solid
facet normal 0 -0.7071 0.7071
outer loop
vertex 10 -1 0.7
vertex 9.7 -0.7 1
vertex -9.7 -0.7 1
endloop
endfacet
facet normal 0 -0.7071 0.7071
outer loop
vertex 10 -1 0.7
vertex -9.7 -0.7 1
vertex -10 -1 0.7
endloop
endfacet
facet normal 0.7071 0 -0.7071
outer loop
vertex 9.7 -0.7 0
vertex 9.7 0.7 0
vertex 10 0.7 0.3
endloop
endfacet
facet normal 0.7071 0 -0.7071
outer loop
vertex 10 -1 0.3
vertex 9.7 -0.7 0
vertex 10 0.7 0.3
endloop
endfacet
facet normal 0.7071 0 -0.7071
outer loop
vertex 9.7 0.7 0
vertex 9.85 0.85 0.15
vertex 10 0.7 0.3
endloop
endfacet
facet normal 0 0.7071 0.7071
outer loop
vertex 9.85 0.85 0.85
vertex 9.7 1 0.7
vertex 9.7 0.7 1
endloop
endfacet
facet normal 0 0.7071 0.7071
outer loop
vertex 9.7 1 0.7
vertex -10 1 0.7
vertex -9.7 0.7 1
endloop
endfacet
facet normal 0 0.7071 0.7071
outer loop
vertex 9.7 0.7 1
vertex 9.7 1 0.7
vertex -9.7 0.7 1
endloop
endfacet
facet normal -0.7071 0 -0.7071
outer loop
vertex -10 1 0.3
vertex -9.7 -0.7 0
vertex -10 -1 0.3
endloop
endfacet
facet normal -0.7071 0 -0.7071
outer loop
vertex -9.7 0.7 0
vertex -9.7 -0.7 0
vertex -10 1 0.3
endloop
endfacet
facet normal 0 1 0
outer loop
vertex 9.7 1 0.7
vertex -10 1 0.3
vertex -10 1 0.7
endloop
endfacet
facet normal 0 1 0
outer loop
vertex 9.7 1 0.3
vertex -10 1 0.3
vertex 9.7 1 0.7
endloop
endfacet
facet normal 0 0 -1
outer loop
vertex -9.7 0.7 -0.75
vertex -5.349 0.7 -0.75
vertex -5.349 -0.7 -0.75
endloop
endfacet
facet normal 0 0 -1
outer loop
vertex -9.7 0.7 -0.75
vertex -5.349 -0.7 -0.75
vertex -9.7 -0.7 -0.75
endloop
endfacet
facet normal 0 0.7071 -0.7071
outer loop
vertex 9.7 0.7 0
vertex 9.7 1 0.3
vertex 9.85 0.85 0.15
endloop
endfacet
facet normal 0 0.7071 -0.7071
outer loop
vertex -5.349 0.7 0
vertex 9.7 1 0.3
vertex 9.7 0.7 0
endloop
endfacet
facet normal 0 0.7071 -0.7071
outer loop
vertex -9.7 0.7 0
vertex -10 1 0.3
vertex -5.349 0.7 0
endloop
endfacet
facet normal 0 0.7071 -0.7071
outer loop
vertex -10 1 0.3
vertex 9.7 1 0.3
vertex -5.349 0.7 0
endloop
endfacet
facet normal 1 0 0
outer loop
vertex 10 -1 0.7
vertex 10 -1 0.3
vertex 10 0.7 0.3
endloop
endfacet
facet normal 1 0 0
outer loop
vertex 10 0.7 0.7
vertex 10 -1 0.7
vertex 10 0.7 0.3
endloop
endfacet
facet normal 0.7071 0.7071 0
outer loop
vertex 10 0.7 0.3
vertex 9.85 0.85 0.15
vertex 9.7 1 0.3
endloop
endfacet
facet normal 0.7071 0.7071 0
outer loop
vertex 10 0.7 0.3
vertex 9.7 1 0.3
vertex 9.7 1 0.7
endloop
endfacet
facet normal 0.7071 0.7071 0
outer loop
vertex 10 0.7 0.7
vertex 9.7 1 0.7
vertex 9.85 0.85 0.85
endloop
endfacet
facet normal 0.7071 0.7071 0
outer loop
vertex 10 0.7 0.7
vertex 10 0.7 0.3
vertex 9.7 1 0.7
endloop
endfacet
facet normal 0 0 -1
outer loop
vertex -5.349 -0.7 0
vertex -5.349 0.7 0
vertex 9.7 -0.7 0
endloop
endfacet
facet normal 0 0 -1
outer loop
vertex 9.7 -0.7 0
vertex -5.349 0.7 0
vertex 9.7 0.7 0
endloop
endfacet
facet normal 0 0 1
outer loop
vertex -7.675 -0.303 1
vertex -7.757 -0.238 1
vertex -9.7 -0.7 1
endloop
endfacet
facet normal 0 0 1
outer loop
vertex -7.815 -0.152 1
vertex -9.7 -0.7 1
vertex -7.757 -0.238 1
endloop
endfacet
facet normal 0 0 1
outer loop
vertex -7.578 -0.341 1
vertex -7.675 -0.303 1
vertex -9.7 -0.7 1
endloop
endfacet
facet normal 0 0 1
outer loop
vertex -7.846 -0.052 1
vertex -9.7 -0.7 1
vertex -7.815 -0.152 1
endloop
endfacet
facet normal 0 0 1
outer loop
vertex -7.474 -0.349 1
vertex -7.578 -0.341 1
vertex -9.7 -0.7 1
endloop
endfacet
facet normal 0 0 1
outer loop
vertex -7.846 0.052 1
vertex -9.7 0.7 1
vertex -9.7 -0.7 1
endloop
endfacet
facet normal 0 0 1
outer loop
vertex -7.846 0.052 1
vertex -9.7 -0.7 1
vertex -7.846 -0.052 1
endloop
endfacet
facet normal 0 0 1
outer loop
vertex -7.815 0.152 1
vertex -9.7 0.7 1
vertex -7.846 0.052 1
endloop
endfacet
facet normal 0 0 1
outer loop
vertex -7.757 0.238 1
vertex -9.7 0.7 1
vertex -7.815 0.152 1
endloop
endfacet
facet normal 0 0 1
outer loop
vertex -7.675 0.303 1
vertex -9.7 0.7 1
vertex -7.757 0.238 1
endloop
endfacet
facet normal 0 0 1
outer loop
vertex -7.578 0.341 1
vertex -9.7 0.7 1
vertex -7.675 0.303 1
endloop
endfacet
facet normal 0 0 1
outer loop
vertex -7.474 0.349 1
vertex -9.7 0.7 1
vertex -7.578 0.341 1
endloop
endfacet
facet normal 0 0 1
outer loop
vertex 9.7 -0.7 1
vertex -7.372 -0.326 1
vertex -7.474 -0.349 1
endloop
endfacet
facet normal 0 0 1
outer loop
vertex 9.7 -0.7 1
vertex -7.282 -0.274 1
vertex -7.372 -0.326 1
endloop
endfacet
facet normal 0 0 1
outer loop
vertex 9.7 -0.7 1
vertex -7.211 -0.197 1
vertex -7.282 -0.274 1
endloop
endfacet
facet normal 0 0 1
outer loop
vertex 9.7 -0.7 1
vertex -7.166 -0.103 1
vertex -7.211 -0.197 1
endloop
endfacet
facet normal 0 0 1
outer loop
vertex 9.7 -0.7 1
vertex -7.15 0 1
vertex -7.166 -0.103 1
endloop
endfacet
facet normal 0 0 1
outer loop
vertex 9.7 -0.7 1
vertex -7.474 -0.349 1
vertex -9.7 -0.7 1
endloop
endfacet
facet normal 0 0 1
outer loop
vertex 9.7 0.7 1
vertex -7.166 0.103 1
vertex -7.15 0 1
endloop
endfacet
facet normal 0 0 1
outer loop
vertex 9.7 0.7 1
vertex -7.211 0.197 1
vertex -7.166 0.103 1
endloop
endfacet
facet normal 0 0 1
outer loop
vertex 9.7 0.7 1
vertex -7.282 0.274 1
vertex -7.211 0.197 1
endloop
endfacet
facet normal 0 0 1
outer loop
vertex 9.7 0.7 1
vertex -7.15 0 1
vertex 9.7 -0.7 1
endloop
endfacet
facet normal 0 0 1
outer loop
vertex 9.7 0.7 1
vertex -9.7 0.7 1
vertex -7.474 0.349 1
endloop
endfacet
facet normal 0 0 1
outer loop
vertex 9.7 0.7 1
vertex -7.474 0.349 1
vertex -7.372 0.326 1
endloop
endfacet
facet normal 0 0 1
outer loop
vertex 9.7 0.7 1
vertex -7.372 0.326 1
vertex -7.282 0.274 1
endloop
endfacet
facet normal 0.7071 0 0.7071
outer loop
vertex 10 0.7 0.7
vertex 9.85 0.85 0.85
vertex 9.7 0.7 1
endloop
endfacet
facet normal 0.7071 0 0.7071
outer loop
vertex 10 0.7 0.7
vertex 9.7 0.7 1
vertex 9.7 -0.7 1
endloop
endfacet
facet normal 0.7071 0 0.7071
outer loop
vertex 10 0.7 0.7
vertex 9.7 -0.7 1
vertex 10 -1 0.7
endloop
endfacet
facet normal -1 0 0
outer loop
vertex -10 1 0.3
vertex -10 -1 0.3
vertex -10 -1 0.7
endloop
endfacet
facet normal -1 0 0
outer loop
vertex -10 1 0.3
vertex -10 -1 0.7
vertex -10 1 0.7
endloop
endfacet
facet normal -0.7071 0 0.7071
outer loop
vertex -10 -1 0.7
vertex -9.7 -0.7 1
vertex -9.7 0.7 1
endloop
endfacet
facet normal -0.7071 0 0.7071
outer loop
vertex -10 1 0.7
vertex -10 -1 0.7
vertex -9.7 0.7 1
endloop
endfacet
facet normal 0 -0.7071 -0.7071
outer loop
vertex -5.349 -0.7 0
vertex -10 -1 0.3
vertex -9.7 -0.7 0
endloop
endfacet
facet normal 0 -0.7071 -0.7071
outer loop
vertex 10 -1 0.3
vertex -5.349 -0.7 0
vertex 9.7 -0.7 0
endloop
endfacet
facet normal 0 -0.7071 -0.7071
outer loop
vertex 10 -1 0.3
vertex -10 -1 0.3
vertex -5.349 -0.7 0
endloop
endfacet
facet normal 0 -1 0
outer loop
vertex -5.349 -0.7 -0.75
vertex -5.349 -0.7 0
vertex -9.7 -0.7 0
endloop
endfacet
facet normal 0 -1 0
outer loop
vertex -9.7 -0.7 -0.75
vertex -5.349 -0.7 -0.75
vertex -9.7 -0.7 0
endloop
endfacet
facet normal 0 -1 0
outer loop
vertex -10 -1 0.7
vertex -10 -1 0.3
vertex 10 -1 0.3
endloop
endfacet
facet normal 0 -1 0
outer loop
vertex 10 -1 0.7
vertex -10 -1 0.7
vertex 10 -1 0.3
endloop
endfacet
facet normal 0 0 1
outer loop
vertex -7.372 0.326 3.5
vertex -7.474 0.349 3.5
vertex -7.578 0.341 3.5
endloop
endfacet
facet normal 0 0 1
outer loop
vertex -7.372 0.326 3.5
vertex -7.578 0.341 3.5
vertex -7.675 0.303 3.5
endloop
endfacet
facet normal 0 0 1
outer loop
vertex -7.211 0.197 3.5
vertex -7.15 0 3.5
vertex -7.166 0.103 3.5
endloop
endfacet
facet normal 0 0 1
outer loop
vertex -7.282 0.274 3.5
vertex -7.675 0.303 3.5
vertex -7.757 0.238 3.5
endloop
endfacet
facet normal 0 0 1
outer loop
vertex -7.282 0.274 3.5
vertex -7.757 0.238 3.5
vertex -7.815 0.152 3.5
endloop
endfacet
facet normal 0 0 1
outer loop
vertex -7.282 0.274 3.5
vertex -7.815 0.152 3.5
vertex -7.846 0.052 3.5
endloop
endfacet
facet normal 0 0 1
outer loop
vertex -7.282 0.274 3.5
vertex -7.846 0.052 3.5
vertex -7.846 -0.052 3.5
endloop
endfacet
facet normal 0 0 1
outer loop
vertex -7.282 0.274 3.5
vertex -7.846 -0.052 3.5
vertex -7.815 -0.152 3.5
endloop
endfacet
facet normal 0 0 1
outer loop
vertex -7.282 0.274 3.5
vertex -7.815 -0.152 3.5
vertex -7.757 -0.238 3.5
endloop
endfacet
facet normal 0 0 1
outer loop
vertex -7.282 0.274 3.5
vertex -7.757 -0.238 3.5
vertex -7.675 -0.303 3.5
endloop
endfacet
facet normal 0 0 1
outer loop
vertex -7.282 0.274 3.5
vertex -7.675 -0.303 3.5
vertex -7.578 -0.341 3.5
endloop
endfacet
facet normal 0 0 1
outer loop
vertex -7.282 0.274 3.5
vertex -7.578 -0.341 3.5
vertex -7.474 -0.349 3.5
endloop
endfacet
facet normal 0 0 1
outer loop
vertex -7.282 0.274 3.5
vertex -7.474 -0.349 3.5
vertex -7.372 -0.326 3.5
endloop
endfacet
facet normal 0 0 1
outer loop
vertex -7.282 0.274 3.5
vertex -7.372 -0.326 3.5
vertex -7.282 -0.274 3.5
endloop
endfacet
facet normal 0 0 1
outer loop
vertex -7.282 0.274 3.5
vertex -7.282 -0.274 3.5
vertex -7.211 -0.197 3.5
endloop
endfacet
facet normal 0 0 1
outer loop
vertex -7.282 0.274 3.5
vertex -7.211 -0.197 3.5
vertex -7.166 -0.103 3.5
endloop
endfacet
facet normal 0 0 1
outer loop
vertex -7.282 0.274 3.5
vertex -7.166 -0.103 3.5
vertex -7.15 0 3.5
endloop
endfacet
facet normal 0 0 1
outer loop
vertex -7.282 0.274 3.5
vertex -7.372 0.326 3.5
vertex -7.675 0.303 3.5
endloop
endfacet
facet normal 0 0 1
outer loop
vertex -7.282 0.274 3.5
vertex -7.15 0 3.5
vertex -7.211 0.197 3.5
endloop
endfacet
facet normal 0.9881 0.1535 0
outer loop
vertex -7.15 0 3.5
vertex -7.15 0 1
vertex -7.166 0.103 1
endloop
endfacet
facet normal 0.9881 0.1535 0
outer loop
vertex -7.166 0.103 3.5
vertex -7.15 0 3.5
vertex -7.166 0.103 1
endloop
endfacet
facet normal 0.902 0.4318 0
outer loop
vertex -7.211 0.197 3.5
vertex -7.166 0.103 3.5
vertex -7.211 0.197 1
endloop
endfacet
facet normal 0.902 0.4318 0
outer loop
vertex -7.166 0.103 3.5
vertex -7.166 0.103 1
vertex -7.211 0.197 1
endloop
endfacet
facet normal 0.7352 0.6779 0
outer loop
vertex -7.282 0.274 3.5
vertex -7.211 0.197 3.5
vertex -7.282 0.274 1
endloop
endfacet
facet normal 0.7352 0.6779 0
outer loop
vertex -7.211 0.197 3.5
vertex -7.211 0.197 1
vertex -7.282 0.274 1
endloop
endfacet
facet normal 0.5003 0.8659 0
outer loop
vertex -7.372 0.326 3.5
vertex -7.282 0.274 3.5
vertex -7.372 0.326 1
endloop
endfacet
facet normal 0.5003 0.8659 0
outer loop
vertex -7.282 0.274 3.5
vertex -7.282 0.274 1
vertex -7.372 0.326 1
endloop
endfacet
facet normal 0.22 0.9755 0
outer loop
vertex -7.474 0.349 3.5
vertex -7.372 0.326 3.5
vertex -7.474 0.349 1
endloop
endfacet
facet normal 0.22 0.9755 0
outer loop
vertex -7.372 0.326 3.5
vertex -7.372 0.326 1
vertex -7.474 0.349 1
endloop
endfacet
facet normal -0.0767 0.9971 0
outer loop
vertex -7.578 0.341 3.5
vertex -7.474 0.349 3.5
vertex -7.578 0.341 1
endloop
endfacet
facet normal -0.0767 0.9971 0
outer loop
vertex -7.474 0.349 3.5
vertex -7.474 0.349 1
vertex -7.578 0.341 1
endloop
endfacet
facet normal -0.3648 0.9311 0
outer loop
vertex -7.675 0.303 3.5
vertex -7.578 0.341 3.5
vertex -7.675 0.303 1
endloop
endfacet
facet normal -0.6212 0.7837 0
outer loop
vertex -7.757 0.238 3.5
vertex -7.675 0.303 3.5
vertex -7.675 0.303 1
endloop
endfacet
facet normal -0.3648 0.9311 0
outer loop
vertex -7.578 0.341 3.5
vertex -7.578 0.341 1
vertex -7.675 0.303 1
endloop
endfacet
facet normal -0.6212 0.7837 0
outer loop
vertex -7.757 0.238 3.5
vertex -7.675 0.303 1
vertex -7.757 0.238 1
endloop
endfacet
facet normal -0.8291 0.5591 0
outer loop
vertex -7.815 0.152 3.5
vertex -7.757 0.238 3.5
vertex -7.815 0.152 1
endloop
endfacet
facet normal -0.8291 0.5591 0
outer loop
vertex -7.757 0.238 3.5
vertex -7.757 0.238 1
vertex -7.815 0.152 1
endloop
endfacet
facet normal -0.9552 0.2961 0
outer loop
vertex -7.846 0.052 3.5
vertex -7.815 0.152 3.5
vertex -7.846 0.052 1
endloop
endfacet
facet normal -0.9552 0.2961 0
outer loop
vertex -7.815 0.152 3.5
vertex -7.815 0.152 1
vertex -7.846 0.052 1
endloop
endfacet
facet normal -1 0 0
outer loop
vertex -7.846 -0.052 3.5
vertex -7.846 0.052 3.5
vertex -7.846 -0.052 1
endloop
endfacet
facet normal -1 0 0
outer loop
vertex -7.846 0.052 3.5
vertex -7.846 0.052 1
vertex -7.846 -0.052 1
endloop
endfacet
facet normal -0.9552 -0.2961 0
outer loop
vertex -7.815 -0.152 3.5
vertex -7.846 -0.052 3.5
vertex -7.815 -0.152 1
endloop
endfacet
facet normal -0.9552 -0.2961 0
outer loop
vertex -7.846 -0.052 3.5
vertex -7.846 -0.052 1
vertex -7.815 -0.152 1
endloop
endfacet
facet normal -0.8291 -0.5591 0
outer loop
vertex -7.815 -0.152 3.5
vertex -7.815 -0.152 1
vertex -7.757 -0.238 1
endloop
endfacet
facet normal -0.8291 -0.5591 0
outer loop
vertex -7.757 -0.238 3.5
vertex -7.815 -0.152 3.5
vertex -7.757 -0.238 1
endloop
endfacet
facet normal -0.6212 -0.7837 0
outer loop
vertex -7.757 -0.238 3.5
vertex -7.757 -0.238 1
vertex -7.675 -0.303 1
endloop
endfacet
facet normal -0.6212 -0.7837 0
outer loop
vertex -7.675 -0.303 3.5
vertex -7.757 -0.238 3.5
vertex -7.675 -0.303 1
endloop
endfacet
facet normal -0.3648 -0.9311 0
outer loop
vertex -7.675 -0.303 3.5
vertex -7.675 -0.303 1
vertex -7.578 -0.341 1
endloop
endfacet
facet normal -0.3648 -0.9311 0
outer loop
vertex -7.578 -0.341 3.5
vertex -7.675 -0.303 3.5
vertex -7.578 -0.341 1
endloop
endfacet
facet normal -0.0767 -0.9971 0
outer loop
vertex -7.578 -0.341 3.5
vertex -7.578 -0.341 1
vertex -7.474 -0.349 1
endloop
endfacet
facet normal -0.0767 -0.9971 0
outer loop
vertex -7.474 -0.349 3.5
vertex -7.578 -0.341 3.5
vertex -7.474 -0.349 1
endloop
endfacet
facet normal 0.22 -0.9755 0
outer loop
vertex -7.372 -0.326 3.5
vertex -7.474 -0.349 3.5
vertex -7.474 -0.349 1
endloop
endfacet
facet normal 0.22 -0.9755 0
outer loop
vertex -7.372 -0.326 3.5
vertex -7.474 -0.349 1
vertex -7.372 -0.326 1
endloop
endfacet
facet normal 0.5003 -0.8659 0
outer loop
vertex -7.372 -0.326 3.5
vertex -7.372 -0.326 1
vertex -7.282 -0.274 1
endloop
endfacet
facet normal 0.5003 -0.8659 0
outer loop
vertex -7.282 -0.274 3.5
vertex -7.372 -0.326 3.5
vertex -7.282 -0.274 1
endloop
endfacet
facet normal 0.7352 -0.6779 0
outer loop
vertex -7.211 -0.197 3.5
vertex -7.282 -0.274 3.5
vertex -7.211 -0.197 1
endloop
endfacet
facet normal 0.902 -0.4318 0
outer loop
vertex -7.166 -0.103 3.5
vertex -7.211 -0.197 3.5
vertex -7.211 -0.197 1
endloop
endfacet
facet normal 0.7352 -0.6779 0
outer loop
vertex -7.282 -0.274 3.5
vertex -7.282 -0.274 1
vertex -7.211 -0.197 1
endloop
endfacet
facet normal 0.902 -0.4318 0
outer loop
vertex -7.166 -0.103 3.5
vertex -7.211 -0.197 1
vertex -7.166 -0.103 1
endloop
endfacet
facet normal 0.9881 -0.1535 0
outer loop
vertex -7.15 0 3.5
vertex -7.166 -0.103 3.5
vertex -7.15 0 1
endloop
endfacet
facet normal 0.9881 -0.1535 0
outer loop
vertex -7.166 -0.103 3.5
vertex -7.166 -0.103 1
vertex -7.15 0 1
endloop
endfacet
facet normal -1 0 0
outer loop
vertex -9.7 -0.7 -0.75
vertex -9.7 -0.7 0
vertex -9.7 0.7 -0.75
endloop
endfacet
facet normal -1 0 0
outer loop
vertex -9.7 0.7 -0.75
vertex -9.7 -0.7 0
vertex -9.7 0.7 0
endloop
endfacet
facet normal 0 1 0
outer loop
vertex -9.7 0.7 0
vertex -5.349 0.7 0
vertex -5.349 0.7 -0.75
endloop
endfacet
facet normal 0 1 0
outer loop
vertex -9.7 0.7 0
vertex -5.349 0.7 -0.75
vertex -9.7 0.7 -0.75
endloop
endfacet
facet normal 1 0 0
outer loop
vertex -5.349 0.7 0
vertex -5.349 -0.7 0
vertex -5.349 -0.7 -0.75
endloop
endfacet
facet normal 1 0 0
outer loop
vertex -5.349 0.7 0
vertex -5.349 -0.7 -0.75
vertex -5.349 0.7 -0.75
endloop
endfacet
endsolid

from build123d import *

# Parameters (mm, degrees)
SKETCH1_W           = 20
SKETCH1_H           = 2
BOSS_EXTRUDE1_DEPTH = 1
SKETCH2_R           = 0.35
BOSS_EXTRUDE3_DEPTH = 2.5
CHAMFER2_SIZE       = 0.3
CHAMFER4_SIZE       = 0.3
CHAMFER5_SIZE       = 0.3
SKETCH4_W           = 4.351090726
SKETCH4_H           = 1.4
BOSS_EXTRUDE4_DEPTH = 0.75


with BuildPart() as part:
    # Sketch1 → Boss-Extrude1 (new body)
    with BuildSketch(Plane.XY):
        Rectangle(SKETCH1_W, SKETCH1_H)
    extrude(amount=BOSS_EXTRUDE1_DEPTH)

    # Sketch2 → Boss-Extrude3 (add)
    with BuildSketch(Plane.XY.offset(1)):
        with Locations((-7.5, 0)):
            Circle(SKETCH2_R)
    extrude(amount=BOSS_EXTRUDE3_DEPTH)

    # Chamfer2
    chamfer2_edges = [part.edges().sort_by_distance(p)[0] for p in [
        (10, 1, 0.5),
    ]]
    chamfer(chamfer2_edges, length=CHAMFER2_SIZE)

    # Chamfer4
    # the kernel refuses this chamfer: 0.3 mm, written as the material it takes off along each edge
    with BuildSketch(Plane(origin=(10, 1.471504896, 0), x_dir=(-0.9996219169112968, 0, -0.02749587661058633), z_dir=(0, -1, 0))) as chamfer4_piece_1:
        Polygon((CHAMFER4_SIZE * 0.999621916911, -CHAMFER4_SIZE * 0.0274958766106), (-CHAMFER4_SIZE * 0.0274958766106, -CHAMFER4_SIZE * 0.999621916911), (0, 0), align=None)
    extrude(amount=3.243009793, mode=Mode.SUBTRACT)
    with BuildSketch(Plane(origin=(10, 1.471504896, 1), x_dir=(-0.9996219169112968, 0, 0.027495876610586622), z_dir=(0, -1, 0))) as chamfer4_piece_2:
        Polygon((CHAMFER4_SIZE * 0.999621916911, CHAMFER4_SIZE * 0.0274958766106), (-CHAMFER4_SIZE * 0.0274958766106, CHAMFER4_SIZE * 0.999621916911), (0, 0), align=None)
    extrude(amount=3.243009793, mode=Mode.SUBTRACT)
    with BuildSketch(Plane(origin=(10.771504896, -1, 1), x_dir=(0, 0.9996219169112968, 0.027495876610586632), z_dir=(-1, 0, 0))) as chamfer4_piece_3:
        Polygon((CHAMFER4_SIZE * 0.999621916911, CHAMFER4_SIZE * 0.0274958766106), (-CHAMFER4_SIZE * 0.0274958766106, CHAMFER4_SIZE * 0.999621916911), (0, 0), align=None)
    extrude(amount=21.543009793, mode=Mode.SUBTRACT)
    with BuildSketch(Plane(origin=(-10.771504896, 1, 0), x_dir=(0, 0.027495876610586632, 0.9996219169112968), z_dir=(1, 0, 0))) as chamfer4_piece_4:
        Polygon((CHAMFER4_SIZE * 0.999621916911, CHAMFER4_SIZE * 0.0274958766106), (-CHAMFER4_SIZE * 0.0274958766106, CHAMFER4_SIZE * 0.999621916911), (0, 0), align=None)
    extrude(amount=21.243009793, mode=Mode.SUBTRACT)
    with BuildSketch(Plane(origin=(-10.771504896, 1, 1), x_dir=(0, 0.027495876610586632, -0.9996219169112968), z_dir=(1, 0, 0))) as chamfer4_piece_5:
        Polygon((CHAMFER4_SIZE * 0.999621916911, -CHAMFER4_SIZE * 0.0274958766106), (-CHAMFER4_SIZE * 0.0274958766106, -CHAMFER4_SIZE * 0.999621916911), (0, 0), align=None)
    extrude(amount=21.243009793, mode=Mode.SUBTRACT)

    # Chamfer5
    chamfer5_edges = [part.edges().sort_by_distance(p)[0] for p in [
        (-10, 0, 1),
        (-10, -0.15, 0),
        (-0.15, -1, 0),
    ]]
    chamfer(chamfer5_edges, length=CHAMFER5_SIZE)

    # Sketch4 → Boss-Extrude4 (add)
    with BuildSketch(Plane(origin=(0, 0, 0), x_dir=(-1, 0, 0), z_dir=(0, 0, -1))):
        with Locations((7.524454637, 0)):
            Rectangle(SKETCH4_W, SKETCH4_H)
    extrude(amount=BOSS_EXTRUDE4_DEPTH)


solid = part.part
